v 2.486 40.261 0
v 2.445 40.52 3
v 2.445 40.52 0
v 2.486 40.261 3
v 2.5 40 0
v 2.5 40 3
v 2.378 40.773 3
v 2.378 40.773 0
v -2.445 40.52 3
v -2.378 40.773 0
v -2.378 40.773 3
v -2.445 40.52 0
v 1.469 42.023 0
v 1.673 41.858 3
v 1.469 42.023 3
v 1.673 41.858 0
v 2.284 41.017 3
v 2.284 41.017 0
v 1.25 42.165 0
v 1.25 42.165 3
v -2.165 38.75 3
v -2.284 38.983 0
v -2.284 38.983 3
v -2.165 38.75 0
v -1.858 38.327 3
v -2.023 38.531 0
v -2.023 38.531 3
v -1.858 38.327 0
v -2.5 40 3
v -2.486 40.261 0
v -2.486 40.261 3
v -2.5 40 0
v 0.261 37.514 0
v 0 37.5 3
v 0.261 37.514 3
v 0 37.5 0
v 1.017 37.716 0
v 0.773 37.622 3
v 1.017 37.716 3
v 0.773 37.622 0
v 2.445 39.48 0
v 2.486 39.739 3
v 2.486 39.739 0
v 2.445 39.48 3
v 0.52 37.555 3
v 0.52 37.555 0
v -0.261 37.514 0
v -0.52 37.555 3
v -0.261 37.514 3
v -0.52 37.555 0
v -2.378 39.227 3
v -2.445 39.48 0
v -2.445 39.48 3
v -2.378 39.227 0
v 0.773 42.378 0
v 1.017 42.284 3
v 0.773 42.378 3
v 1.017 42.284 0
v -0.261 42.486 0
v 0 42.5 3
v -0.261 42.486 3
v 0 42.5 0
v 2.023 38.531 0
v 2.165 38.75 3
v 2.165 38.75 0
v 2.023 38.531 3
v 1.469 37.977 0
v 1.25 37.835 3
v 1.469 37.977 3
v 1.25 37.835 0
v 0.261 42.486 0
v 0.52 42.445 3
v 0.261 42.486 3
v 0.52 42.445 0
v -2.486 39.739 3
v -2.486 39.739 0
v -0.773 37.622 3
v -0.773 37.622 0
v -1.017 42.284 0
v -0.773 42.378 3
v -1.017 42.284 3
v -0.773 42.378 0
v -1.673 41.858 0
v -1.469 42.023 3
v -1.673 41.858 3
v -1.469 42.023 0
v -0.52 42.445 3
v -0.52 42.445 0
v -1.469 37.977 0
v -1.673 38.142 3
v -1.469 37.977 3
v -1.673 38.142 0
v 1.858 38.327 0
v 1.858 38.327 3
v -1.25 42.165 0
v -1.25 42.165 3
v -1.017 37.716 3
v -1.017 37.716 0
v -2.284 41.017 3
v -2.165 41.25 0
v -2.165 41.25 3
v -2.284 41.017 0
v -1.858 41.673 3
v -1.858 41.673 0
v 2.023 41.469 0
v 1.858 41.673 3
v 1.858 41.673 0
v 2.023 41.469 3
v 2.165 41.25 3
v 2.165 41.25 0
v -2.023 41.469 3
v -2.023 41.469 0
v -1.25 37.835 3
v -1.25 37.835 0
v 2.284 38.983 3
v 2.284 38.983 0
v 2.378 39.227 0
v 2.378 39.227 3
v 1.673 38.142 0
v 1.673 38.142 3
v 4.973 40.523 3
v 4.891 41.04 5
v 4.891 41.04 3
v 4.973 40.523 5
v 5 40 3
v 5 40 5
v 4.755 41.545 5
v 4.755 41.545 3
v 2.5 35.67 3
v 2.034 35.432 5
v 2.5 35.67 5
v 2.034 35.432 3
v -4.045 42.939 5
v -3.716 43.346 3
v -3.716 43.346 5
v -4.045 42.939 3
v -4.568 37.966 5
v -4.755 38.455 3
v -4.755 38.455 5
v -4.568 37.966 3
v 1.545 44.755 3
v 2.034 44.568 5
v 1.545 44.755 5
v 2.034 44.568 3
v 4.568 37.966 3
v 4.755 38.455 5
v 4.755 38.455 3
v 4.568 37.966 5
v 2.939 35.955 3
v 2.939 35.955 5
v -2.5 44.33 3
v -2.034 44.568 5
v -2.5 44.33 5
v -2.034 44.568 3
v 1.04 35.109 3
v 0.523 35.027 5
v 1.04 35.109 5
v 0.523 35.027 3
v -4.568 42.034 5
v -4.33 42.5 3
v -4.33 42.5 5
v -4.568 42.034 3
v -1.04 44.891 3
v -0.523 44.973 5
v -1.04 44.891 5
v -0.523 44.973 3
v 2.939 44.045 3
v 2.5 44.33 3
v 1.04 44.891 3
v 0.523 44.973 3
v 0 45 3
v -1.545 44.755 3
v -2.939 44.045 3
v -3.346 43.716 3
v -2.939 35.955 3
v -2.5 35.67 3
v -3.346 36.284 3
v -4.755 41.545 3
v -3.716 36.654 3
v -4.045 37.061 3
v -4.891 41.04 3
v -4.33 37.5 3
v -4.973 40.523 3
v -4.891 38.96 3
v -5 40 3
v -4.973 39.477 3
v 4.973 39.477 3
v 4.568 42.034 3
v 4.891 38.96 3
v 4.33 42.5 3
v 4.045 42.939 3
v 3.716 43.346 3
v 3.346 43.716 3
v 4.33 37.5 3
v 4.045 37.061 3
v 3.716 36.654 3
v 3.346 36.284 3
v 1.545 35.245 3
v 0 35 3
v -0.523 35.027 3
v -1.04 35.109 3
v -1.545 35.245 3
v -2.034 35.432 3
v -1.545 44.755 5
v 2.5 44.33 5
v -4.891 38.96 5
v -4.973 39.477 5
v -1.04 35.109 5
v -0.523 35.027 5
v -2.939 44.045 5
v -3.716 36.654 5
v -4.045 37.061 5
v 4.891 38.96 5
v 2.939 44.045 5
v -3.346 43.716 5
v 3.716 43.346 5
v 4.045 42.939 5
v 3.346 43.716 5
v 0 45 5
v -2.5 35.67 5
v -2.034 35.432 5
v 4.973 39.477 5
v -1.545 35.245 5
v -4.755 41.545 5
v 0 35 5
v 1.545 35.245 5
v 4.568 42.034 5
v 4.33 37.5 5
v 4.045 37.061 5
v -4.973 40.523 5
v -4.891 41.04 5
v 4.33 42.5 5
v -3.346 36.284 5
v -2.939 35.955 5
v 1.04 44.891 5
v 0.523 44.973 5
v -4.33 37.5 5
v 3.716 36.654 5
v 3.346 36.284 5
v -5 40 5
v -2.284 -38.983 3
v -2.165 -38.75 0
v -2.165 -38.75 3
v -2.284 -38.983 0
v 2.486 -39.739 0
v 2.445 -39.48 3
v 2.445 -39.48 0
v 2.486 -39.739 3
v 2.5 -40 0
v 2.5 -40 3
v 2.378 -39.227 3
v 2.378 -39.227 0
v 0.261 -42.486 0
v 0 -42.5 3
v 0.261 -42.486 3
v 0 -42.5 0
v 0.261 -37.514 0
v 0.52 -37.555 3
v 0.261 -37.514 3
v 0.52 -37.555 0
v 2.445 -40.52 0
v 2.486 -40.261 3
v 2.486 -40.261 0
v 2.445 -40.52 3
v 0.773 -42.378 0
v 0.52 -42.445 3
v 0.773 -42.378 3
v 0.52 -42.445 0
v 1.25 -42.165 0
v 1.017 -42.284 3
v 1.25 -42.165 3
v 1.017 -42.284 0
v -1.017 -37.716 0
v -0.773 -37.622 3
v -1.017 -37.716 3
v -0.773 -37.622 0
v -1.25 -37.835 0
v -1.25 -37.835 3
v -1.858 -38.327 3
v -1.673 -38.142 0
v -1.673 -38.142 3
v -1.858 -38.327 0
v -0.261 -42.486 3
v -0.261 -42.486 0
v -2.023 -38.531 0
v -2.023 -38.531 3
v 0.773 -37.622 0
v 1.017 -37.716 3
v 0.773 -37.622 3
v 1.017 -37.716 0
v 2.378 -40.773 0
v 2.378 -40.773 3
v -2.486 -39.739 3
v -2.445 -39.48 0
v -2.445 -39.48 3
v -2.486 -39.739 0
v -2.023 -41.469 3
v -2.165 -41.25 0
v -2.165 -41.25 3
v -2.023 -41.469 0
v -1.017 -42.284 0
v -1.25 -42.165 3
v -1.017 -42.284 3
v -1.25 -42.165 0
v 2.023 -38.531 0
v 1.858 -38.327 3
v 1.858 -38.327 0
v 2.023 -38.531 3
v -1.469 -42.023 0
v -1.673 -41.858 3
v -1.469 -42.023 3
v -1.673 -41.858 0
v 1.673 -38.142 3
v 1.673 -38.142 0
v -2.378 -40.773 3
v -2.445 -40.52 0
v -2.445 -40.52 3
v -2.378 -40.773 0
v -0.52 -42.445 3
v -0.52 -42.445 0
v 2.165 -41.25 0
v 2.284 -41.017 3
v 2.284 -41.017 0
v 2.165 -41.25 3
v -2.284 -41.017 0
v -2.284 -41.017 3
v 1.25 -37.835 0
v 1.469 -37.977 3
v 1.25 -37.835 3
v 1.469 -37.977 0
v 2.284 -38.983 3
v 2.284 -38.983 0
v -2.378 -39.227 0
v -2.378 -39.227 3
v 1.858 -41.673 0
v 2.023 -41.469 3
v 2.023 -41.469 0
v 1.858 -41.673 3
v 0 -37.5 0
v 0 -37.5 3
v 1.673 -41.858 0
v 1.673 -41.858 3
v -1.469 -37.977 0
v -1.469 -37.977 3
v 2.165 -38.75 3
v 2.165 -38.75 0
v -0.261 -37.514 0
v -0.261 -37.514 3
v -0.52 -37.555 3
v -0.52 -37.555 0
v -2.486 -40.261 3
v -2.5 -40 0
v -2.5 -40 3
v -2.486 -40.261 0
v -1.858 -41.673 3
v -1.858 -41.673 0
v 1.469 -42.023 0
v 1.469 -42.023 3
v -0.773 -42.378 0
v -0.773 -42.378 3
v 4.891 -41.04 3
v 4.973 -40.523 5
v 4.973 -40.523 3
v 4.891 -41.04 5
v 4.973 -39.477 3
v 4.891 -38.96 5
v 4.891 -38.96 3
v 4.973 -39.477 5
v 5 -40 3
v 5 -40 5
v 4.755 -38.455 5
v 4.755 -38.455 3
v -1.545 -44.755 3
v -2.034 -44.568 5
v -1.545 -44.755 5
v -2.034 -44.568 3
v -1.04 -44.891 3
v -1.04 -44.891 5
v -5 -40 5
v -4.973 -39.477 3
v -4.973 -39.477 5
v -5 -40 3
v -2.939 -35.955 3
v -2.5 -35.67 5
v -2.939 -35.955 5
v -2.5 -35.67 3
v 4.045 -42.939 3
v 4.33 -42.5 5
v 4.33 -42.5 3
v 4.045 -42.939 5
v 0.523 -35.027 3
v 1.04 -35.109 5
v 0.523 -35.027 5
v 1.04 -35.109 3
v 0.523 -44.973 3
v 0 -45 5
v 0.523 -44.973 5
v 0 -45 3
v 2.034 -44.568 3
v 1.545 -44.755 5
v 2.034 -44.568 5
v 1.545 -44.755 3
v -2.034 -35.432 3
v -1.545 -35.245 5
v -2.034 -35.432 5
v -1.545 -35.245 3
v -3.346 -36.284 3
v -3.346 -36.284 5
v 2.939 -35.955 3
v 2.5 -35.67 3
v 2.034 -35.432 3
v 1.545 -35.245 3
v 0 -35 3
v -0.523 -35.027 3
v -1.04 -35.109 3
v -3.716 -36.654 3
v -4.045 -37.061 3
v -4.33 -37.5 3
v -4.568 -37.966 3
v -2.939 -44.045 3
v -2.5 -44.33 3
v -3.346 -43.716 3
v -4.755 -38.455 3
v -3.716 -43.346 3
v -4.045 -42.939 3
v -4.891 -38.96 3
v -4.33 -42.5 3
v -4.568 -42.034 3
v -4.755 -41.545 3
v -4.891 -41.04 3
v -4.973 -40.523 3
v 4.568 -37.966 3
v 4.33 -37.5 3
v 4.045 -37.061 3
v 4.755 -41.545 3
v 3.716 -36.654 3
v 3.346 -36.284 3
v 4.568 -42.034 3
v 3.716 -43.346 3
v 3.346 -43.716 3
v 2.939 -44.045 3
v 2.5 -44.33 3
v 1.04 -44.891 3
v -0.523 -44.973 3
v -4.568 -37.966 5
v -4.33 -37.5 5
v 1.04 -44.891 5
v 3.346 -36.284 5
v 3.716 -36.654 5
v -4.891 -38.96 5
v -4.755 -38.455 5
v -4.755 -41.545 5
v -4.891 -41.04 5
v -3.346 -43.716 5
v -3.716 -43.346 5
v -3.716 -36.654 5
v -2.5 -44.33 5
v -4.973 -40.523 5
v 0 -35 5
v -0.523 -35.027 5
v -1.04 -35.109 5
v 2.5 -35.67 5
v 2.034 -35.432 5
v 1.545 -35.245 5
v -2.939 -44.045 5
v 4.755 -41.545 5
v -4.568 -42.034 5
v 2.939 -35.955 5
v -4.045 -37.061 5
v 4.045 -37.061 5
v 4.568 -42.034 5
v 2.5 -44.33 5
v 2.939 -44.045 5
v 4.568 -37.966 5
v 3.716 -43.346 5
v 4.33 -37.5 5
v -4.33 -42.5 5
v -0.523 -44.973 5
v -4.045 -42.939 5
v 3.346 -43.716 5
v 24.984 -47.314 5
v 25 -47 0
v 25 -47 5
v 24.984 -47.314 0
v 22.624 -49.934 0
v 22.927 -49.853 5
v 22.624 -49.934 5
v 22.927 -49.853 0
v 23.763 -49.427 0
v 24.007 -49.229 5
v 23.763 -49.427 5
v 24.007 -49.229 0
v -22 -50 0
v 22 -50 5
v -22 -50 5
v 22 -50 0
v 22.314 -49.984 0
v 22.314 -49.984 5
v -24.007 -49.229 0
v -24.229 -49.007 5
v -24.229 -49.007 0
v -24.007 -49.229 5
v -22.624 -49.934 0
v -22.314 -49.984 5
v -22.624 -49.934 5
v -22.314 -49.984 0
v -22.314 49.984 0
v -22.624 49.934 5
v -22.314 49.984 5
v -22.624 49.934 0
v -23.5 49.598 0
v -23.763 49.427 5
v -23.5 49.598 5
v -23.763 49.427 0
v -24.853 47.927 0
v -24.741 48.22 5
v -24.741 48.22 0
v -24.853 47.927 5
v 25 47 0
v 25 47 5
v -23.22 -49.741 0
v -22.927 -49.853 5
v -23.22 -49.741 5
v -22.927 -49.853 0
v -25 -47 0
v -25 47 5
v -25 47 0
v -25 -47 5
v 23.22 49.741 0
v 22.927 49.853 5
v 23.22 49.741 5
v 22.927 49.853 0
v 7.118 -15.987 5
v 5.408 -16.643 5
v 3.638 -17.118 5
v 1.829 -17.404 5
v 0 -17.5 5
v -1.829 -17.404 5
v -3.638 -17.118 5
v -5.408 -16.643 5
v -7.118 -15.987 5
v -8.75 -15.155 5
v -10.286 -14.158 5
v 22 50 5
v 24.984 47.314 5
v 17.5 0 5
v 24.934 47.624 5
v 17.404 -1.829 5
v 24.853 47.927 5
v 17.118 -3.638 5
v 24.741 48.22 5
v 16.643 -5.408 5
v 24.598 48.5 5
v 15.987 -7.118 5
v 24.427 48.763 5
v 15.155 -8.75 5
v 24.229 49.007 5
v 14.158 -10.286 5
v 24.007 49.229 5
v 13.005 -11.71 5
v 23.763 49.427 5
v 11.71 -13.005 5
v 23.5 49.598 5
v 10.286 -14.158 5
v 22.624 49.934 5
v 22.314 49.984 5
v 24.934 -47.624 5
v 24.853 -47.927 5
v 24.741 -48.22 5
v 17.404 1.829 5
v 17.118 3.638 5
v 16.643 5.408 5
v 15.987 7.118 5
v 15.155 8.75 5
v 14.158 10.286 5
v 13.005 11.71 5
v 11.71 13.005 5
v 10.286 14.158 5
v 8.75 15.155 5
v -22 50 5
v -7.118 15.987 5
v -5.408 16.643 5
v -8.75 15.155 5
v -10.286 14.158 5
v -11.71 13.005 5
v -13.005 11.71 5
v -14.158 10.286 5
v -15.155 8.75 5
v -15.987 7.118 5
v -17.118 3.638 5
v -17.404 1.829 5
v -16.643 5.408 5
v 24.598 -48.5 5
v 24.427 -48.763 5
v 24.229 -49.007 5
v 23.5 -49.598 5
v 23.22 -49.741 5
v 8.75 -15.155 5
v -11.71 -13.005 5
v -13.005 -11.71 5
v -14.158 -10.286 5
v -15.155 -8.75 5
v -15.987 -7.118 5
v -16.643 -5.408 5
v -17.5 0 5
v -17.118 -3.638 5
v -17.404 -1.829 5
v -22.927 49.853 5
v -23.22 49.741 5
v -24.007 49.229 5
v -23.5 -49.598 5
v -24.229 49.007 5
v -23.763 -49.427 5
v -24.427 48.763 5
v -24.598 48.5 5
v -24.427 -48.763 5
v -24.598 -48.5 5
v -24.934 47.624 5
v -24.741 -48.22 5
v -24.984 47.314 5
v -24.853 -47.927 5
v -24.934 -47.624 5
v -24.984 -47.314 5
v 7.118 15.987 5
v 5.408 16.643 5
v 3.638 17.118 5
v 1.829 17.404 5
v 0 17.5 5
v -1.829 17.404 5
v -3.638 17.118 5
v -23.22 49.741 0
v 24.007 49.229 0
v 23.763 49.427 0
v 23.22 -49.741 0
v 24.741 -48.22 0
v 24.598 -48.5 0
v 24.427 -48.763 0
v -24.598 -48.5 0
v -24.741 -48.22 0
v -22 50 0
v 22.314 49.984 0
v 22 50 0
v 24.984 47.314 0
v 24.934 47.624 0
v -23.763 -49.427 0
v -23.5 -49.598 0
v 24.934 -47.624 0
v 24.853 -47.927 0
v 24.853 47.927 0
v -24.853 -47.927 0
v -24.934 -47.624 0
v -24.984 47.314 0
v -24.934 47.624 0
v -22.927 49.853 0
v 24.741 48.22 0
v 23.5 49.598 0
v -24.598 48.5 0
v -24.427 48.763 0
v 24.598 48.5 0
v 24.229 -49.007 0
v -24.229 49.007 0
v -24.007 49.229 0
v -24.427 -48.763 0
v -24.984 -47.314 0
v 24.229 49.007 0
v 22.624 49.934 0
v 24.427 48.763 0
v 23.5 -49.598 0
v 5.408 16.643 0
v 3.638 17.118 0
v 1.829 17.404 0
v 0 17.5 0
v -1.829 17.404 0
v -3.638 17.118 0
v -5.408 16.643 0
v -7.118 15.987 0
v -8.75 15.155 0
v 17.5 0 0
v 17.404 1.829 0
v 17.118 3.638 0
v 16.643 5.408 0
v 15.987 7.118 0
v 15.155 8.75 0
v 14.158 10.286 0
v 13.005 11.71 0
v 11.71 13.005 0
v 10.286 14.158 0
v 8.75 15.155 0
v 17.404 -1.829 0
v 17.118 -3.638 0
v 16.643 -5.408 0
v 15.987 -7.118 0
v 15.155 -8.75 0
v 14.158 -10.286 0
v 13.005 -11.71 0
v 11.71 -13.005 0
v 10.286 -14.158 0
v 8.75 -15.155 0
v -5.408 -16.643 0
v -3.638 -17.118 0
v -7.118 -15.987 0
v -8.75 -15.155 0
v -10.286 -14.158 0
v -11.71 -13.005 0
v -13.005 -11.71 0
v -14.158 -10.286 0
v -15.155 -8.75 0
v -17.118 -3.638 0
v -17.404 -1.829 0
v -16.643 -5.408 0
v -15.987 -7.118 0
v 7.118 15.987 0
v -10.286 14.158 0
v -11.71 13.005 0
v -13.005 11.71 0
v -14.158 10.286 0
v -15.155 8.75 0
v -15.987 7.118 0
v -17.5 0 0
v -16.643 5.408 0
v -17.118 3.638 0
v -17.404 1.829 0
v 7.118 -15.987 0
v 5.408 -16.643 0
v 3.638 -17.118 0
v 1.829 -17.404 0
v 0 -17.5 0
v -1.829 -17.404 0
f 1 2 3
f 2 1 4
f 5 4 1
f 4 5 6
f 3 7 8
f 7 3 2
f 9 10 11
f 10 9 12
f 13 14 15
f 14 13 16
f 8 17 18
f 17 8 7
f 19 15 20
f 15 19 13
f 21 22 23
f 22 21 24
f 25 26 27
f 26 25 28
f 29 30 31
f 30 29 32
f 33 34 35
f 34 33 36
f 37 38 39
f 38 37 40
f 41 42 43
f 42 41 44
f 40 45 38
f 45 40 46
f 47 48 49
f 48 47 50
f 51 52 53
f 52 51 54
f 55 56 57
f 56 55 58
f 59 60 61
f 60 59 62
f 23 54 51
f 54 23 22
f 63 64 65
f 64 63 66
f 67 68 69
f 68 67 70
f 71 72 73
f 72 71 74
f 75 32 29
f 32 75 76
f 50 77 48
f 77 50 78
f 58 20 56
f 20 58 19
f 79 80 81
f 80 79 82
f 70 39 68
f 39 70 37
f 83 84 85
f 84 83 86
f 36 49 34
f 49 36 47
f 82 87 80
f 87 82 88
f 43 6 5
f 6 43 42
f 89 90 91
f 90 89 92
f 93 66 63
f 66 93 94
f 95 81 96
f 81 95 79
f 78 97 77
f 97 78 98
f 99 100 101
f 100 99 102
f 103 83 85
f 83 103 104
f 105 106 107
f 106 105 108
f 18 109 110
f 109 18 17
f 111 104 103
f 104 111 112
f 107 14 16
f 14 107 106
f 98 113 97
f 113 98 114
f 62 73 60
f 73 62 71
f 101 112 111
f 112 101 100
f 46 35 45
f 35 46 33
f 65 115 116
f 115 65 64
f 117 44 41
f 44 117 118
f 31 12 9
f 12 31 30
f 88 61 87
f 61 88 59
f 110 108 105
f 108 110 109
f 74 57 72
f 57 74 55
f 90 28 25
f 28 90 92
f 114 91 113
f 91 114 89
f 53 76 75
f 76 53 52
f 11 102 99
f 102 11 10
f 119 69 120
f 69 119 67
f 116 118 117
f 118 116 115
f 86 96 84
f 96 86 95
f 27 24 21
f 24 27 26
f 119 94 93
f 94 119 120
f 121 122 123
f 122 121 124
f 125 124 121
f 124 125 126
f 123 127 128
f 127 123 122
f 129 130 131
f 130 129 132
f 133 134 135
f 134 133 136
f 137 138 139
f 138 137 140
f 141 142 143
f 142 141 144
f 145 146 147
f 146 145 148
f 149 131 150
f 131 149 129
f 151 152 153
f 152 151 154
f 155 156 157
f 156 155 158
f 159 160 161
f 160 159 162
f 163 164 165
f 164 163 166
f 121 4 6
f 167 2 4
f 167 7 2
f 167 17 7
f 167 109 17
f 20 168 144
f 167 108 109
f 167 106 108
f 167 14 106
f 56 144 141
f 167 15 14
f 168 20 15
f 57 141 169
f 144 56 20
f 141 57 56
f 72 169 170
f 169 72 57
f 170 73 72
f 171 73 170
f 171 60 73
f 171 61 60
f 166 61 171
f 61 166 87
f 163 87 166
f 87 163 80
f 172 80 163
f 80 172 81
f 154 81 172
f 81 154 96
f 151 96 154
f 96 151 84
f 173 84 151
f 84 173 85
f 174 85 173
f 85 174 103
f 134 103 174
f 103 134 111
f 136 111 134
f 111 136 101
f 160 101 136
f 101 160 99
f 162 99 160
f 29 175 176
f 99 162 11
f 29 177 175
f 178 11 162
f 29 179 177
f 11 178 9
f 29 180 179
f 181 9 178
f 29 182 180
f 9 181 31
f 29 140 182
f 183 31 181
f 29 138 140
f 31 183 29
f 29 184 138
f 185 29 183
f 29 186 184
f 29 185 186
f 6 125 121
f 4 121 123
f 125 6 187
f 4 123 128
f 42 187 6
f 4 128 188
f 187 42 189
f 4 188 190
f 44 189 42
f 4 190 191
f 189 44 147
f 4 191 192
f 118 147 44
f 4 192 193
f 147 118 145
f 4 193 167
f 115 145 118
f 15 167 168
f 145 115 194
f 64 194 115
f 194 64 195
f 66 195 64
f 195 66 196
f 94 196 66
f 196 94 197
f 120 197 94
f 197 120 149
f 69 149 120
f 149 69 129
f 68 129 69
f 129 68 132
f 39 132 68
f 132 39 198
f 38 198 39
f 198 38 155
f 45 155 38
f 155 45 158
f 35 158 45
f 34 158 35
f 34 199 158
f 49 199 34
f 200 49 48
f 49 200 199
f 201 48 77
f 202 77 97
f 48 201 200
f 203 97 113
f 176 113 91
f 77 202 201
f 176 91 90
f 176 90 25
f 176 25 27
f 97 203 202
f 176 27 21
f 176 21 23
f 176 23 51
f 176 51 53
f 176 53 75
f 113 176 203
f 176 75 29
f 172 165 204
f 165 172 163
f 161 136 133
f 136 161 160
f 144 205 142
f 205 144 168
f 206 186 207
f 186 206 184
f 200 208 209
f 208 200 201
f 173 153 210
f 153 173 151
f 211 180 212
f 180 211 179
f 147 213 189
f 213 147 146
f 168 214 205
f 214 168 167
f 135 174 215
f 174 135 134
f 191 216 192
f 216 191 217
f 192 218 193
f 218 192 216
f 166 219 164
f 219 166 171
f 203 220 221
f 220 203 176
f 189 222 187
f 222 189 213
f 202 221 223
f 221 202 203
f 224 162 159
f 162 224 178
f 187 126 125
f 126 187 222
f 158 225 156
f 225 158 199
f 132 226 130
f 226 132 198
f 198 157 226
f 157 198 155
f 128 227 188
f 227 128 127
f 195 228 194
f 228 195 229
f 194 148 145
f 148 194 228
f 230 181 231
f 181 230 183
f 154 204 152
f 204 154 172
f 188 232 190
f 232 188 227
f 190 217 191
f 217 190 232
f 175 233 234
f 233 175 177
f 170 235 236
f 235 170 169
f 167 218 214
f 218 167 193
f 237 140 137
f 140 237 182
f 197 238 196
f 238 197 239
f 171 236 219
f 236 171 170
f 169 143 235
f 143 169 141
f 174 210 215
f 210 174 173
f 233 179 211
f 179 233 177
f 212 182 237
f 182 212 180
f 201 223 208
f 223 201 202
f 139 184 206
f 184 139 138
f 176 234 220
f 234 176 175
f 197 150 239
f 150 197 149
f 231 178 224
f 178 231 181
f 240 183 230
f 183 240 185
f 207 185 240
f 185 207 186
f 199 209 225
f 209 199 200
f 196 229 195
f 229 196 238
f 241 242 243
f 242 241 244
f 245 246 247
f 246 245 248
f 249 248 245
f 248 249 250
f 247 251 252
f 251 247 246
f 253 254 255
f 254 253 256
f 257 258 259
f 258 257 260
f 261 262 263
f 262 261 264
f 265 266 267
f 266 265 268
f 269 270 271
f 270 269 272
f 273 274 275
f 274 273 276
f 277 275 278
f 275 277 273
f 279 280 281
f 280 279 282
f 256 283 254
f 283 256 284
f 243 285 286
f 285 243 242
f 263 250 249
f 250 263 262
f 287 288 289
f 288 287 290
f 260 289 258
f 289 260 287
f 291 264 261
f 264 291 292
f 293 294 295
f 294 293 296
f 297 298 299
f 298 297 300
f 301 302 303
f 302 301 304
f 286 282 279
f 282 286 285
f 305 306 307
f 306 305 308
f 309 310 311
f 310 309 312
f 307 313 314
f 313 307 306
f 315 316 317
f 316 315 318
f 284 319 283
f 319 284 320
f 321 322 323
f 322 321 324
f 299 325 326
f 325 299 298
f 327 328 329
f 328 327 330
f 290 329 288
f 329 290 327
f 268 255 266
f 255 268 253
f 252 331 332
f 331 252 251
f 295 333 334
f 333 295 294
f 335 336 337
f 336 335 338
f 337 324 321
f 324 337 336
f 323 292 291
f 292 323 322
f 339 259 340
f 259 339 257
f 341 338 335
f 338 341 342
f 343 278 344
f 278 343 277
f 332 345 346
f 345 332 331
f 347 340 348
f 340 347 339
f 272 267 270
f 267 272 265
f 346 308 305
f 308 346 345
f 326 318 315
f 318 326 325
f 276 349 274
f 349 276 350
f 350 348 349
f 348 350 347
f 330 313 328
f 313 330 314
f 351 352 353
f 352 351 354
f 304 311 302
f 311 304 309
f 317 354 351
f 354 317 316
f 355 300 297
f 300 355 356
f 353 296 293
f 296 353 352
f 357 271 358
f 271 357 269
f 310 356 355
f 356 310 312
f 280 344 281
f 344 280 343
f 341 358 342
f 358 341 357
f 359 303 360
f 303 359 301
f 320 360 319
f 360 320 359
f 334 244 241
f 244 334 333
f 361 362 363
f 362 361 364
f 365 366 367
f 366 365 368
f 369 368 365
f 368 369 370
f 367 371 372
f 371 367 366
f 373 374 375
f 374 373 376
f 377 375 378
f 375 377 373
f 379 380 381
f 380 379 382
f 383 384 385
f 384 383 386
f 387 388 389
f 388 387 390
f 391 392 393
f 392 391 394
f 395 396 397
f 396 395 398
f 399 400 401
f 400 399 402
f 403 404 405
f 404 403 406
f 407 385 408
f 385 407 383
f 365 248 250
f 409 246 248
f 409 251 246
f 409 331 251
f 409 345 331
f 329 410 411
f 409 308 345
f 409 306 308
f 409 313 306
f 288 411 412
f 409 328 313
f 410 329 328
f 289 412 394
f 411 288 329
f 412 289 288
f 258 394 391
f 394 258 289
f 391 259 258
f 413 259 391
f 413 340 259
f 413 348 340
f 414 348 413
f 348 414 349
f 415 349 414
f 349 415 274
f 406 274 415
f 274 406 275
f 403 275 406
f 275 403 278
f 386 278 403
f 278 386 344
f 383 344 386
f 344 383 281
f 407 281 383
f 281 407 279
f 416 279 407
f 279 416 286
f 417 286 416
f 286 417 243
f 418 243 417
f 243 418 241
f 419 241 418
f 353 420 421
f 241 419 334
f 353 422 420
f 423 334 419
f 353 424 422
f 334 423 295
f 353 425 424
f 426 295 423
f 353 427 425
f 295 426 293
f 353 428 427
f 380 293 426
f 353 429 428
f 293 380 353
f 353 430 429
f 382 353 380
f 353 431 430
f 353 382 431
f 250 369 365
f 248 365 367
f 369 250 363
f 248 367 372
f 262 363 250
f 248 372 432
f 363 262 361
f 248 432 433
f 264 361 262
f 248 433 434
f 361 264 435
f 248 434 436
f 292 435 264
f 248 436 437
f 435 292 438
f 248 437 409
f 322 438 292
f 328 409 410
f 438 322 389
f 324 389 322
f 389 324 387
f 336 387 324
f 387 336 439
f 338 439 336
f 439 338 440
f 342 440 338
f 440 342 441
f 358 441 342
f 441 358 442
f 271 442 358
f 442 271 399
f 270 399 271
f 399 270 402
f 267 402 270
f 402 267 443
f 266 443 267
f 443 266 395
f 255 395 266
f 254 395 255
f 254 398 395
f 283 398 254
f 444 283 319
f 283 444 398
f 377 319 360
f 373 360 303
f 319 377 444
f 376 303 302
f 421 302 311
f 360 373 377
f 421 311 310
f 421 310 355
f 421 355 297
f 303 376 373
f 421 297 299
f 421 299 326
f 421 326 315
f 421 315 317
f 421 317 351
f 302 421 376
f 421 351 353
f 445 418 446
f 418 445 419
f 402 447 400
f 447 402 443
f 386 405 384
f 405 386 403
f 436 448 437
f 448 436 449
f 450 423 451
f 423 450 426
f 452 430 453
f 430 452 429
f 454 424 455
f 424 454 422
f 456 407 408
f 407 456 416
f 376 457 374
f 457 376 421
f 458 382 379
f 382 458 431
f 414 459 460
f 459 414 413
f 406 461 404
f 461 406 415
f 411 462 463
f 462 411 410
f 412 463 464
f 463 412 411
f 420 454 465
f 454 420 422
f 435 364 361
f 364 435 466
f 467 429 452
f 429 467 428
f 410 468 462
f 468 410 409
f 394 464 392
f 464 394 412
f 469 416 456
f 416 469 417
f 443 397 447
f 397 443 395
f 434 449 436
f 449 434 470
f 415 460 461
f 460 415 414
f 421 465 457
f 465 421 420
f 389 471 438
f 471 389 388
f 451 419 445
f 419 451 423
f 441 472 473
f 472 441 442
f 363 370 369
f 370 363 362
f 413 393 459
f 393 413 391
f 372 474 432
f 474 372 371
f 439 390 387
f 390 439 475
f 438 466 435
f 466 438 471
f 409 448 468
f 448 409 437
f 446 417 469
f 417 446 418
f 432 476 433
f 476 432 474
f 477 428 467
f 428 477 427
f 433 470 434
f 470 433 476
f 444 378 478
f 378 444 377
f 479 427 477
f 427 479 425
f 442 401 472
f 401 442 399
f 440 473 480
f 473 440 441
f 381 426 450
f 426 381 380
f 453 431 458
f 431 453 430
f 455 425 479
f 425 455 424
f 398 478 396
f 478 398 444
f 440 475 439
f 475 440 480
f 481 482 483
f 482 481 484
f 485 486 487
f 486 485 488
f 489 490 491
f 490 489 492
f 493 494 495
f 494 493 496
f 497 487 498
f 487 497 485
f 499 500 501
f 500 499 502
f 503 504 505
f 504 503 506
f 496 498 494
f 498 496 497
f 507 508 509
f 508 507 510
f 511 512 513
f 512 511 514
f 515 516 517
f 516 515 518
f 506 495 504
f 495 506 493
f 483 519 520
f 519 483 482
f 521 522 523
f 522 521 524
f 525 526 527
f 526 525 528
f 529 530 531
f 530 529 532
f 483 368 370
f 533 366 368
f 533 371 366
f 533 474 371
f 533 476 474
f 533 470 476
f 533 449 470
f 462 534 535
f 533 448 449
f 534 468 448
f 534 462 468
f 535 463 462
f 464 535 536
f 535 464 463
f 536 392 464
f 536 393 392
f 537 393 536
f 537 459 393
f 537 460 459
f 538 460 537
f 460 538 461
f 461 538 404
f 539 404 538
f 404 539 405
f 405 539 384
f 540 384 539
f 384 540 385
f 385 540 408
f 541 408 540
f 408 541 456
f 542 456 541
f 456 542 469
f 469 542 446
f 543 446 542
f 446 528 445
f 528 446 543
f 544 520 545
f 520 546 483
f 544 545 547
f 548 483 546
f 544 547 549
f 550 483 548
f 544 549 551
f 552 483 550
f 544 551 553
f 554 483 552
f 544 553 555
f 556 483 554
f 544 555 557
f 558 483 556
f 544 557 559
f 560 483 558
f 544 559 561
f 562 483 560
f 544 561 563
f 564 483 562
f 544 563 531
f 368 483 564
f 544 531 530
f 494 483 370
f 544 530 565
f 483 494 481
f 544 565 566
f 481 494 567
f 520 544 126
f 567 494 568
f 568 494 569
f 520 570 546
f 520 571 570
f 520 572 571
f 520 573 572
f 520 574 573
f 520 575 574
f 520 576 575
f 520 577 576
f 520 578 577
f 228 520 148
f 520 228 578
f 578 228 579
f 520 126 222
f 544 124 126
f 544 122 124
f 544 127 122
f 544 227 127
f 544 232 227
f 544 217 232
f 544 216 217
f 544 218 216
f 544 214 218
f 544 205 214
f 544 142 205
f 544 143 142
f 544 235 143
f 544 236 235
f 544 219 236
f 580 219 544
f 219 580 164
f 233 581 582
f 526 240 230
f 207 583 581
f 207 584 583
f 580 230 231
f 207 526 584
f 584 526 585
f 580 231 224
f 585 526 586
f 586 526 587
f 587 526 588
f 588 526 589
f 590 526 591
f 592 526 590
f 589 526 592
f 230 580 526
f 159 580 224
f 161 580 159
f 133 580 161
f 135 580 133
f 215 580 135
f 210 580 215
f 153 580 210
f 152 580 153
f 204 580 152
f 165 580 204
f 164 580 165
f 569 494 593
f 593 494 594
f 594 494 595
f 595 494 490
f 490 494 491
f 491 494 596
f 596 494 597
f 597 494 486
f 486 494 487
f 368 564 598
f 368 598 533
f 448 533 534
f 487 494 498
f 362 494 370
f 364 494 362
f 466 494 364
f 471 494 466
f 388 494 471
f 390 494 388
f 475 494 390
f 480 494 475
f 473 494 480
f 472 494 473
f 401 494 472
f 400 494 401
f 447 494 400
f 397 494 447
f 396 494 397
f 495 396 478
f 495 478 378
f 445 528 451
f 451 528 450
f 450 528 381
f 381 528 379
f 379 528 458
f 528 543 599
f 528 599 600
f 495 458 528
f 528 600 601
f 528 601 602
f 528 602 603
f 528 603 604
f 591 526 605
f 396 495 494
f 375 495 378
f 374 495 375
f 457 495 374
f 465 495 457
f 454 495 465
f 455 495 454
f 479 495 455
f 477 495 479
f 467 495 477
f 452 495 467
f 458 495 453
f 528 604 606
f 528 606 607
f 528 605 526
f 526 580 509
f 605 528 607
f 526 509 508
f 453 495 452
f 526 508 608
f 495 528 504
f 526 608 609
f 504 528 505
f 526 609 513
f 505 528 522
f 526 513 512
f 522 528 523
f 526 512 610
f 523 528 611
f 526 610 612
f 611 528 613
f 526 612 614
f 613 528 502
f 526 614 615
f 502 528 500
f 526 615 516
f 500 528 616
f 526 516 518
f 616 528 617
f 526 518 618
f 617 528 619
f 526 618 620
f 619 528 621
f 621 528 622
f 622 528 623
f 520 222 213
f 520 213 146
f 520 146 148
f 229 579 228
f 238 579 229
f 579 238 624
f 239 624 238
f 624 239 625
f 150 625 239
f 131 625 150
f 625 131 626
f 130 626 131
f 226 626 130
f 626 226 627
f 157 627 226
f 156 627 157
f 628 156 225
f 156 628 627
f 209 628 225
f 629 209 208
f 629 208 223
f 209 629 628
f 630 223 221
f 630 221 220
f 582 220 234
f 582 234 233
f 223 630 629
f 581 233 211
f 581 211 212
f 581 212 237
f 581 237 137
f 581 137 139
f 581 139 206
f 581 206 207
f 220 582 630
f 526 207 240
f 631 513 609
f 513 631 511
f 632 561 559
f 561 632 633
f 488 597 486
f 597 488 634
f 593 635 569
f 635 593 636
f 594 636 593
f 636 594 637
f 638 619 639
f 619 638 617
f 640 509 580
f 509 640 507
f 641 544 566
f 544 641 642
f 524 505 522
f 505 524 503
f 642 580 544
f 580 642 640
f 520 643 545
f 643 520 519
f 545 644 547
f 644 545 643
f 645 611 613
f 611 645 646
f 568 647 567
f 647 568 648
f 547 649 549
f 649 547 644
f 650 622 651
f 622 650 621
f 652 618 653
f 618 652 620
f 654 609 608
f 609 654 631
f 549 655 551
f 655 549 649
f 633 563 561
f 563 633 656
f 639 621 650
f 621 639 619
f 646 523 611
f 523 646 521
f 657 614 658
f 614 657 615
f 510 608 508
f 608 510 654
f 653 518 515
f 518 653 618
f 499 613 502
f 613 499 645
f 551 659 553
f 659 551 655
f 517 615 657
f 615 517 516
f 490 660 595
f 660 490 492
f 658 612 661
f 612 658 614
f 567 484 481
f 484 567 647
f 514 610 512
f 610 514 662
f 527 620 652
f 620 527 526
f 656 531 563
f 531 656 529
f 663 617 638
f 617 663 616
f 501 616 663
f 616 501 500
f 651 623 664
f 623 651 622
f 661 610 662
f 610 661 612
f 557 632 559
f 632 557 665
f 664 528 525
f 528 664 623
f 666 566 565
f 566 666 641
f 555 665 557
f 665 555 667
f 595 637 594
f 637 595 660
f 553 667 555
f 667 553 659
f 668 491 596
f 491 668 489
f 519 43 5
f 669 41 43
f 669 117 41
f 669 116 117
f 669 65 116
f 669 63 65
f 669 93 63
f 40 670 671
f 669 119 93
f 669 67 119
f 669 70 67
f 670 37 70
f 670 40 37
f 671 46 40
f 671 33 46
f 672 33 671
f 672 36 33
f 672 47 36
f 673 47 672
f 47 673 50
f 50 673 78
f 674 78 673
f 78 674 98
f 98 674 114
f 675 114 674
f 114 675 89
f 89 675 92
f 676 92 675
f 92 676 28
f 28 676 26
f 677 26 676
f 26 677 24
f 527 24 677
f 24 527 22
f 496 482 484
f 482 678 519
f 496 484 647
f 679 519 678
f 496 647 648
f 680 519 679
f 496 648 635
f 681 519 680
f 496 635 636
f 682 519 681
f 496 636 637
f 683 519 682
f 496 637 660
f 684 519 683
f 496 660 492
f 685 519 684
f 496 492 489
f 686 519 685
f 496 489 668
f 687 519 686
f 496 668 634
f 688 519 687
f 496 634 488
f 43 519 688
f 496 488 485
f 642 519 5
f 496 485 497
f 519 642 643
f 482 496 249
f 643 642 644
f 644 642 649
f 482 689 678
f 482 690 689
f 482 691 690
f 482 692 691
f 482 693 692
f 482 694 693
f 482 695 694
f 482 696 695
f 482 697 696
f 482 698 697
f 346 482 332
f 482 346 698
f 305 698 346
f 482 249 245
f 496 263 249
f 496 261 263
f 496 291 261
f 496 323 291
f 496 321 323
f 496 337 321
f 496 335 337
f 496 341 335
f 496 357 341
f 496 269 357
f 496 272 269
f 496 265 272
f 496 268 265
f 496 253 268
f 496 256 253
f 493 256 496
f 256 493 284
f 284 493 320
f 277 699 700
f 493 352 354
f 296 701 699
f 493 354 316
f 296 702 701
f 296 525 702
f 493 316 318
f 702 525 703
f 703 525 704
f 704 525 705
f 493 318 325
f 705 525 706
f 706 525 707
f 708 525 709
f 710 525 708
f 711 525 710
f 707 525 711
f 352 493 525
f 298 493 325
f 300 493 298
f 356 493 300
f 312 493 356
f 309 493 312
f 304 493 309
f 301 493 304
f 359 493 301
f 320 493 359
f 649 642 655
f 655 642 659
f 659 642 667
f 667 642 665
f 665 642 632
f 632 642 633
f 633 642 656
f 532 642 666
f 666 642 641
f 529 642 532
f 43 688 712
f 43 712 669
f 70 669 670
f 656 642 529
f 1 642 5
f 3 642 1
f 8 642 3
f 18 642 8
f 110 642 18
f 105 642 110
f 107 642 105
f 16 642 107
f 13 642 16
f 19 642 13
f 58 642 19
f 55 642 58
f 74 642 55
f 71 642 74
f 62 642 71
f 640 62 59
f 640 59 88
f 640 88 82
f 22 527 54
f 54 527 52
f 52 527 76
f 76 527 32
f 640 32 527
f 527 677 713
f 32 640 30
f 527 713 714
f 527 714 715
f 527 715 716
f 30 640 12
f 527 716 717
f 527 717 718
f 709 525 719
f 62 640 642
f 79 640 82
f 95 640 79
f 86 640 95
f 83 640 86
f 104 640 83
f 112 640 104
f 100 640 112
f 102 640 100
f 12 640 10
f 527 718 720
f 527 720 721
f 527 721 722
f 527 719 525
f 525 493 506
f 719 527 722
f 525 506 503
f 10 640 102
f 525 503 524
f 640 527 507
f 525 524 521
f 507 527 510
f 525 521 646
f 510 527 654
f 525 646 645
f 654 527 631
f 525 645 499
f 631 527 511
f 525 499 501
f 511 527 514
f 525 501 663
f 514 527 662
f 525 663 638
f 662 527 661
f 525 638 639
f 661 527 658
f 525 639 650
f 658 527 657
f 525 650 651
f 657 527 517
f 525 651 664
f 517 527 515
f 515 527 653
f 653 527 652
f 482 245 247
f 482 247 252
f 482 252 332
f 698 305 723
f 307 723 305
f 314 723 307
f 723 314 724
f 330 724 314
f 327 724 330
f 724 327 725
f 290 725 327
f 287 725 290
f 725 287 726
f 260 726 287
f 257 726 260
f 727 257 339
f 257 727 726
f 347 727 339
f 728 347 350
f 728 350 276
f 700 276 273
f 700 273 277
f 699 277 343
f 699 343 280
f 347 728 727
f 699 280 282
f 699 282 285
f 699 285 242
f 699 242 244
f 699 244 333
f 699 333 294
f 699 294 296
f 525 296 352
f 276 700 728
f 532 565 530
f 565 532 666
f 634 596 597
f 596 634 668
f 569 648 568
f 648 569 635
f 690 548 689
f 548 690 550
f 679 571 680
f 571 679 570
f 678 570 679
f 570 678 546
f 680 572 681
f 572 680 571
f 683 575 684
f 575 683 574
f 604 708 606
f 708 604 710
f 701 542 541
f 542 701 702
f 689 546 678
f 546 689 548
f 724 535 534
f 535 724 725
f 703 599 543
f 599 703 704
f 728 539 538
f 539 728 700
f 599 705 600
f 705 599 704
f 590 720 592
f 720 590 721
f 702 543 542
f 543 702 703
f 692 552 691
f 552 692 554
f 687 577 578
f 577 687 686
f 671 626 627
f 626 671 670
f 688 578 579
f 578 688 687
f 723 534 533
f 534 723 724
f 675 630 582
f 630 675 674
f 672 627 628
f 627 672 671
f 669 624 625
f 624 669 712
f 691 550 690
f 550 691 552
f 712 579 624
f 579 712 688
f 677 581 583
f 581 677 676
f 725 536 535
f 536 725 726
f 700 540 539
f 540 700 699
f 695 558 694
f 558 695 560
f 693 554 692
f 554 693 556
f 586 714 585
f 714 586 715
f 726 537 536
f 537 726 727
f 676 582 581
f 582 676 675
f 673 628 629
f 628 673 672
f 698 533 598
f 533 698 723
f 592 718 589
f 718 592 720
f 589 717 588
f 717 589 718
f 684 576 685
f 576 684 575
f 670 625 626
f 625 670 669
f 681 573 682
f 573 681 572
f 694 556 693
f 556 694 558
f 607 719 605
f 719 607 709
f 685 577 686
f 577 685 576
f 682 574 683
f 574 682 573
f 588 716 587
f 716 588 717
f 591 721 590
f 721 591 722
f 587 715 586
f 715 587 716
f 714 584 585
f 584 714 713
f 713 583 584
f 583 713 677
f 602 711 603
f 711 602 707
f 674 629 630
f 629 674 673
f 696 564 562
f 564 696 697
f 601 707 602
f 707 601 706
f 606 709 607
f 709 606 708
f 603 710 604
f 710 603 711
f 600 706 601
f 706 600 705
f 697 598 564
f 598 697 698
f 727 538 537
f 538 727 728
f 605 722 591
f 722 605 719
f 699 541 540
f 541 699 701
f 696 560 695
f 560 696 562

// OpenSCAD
// ============================================
// AP Spacer
// ============================================

// --- Configurable Parameters ---

// Width of the spacer
spacer_width = 100;         // mm

// Length of the spacer
spacer_length = 50;        // mm

// Thickness of the spacer
spacer_thickness = 5;      // mm

// Corner radius
corner_radius = 3;         // mm

// --- Bolt Hole Parameters ---

// Bolt hole diameter
hole_diameter = 5;         // mm

// Distance from top edge to top hole center
hole_edge_distance = 10;   // mm

// Distance between hole centers
hole_spacing = 80;         // mm

// Countersink diameter
countersink_diameter = 10; // mm

// Countersink depth
countersink_depth = 2;     // mm

// --- Center Hole Parameters ---

// Center hole diameter
center_hole_diameter = 35; // mm

// Distance from top edge to center hole
center_hole_distance = 50; // mm

// Resolution
$fn = 60;

// --- Spacer ---

module spacer() {
    difference() {
        // Base plate with rounded corners
        linear_extrude(height=spacer_thickness)
            offset(r=corner_radius)
            square([spacer_length - 2 * corner_radius,
                    spacer_width - 2 * corner_radius], center=true);

        // Top hole: pinned to edge distance
        top_hole_y = spacer_width / 2 - hole_edge_distance;
        // Bottom hole: spaced from top hole
        bottom_hole_y = top_hole_y - hole_spacing;

        // Center hole
        translate([0, spacer_width / 2 - center_hole_distance, -0.1])
            cylinder(h=spacer_thickness + 0.2, d=center_hole_diameter);

        for (y = [top_hole_y, bottom_hole_y]) {
            // Through hole
            translate([0, y, -0.1])
                cylinder(h=spacer_thickness + 0.2, d=hole_diameter);

            // Countersink from the top
            translate([0, y, spacer_thickness - countersink_depth])
                cylinder(h=countersink_depth + 0.1, d=countersink_diameter);
        }
    }
}

spacer();
